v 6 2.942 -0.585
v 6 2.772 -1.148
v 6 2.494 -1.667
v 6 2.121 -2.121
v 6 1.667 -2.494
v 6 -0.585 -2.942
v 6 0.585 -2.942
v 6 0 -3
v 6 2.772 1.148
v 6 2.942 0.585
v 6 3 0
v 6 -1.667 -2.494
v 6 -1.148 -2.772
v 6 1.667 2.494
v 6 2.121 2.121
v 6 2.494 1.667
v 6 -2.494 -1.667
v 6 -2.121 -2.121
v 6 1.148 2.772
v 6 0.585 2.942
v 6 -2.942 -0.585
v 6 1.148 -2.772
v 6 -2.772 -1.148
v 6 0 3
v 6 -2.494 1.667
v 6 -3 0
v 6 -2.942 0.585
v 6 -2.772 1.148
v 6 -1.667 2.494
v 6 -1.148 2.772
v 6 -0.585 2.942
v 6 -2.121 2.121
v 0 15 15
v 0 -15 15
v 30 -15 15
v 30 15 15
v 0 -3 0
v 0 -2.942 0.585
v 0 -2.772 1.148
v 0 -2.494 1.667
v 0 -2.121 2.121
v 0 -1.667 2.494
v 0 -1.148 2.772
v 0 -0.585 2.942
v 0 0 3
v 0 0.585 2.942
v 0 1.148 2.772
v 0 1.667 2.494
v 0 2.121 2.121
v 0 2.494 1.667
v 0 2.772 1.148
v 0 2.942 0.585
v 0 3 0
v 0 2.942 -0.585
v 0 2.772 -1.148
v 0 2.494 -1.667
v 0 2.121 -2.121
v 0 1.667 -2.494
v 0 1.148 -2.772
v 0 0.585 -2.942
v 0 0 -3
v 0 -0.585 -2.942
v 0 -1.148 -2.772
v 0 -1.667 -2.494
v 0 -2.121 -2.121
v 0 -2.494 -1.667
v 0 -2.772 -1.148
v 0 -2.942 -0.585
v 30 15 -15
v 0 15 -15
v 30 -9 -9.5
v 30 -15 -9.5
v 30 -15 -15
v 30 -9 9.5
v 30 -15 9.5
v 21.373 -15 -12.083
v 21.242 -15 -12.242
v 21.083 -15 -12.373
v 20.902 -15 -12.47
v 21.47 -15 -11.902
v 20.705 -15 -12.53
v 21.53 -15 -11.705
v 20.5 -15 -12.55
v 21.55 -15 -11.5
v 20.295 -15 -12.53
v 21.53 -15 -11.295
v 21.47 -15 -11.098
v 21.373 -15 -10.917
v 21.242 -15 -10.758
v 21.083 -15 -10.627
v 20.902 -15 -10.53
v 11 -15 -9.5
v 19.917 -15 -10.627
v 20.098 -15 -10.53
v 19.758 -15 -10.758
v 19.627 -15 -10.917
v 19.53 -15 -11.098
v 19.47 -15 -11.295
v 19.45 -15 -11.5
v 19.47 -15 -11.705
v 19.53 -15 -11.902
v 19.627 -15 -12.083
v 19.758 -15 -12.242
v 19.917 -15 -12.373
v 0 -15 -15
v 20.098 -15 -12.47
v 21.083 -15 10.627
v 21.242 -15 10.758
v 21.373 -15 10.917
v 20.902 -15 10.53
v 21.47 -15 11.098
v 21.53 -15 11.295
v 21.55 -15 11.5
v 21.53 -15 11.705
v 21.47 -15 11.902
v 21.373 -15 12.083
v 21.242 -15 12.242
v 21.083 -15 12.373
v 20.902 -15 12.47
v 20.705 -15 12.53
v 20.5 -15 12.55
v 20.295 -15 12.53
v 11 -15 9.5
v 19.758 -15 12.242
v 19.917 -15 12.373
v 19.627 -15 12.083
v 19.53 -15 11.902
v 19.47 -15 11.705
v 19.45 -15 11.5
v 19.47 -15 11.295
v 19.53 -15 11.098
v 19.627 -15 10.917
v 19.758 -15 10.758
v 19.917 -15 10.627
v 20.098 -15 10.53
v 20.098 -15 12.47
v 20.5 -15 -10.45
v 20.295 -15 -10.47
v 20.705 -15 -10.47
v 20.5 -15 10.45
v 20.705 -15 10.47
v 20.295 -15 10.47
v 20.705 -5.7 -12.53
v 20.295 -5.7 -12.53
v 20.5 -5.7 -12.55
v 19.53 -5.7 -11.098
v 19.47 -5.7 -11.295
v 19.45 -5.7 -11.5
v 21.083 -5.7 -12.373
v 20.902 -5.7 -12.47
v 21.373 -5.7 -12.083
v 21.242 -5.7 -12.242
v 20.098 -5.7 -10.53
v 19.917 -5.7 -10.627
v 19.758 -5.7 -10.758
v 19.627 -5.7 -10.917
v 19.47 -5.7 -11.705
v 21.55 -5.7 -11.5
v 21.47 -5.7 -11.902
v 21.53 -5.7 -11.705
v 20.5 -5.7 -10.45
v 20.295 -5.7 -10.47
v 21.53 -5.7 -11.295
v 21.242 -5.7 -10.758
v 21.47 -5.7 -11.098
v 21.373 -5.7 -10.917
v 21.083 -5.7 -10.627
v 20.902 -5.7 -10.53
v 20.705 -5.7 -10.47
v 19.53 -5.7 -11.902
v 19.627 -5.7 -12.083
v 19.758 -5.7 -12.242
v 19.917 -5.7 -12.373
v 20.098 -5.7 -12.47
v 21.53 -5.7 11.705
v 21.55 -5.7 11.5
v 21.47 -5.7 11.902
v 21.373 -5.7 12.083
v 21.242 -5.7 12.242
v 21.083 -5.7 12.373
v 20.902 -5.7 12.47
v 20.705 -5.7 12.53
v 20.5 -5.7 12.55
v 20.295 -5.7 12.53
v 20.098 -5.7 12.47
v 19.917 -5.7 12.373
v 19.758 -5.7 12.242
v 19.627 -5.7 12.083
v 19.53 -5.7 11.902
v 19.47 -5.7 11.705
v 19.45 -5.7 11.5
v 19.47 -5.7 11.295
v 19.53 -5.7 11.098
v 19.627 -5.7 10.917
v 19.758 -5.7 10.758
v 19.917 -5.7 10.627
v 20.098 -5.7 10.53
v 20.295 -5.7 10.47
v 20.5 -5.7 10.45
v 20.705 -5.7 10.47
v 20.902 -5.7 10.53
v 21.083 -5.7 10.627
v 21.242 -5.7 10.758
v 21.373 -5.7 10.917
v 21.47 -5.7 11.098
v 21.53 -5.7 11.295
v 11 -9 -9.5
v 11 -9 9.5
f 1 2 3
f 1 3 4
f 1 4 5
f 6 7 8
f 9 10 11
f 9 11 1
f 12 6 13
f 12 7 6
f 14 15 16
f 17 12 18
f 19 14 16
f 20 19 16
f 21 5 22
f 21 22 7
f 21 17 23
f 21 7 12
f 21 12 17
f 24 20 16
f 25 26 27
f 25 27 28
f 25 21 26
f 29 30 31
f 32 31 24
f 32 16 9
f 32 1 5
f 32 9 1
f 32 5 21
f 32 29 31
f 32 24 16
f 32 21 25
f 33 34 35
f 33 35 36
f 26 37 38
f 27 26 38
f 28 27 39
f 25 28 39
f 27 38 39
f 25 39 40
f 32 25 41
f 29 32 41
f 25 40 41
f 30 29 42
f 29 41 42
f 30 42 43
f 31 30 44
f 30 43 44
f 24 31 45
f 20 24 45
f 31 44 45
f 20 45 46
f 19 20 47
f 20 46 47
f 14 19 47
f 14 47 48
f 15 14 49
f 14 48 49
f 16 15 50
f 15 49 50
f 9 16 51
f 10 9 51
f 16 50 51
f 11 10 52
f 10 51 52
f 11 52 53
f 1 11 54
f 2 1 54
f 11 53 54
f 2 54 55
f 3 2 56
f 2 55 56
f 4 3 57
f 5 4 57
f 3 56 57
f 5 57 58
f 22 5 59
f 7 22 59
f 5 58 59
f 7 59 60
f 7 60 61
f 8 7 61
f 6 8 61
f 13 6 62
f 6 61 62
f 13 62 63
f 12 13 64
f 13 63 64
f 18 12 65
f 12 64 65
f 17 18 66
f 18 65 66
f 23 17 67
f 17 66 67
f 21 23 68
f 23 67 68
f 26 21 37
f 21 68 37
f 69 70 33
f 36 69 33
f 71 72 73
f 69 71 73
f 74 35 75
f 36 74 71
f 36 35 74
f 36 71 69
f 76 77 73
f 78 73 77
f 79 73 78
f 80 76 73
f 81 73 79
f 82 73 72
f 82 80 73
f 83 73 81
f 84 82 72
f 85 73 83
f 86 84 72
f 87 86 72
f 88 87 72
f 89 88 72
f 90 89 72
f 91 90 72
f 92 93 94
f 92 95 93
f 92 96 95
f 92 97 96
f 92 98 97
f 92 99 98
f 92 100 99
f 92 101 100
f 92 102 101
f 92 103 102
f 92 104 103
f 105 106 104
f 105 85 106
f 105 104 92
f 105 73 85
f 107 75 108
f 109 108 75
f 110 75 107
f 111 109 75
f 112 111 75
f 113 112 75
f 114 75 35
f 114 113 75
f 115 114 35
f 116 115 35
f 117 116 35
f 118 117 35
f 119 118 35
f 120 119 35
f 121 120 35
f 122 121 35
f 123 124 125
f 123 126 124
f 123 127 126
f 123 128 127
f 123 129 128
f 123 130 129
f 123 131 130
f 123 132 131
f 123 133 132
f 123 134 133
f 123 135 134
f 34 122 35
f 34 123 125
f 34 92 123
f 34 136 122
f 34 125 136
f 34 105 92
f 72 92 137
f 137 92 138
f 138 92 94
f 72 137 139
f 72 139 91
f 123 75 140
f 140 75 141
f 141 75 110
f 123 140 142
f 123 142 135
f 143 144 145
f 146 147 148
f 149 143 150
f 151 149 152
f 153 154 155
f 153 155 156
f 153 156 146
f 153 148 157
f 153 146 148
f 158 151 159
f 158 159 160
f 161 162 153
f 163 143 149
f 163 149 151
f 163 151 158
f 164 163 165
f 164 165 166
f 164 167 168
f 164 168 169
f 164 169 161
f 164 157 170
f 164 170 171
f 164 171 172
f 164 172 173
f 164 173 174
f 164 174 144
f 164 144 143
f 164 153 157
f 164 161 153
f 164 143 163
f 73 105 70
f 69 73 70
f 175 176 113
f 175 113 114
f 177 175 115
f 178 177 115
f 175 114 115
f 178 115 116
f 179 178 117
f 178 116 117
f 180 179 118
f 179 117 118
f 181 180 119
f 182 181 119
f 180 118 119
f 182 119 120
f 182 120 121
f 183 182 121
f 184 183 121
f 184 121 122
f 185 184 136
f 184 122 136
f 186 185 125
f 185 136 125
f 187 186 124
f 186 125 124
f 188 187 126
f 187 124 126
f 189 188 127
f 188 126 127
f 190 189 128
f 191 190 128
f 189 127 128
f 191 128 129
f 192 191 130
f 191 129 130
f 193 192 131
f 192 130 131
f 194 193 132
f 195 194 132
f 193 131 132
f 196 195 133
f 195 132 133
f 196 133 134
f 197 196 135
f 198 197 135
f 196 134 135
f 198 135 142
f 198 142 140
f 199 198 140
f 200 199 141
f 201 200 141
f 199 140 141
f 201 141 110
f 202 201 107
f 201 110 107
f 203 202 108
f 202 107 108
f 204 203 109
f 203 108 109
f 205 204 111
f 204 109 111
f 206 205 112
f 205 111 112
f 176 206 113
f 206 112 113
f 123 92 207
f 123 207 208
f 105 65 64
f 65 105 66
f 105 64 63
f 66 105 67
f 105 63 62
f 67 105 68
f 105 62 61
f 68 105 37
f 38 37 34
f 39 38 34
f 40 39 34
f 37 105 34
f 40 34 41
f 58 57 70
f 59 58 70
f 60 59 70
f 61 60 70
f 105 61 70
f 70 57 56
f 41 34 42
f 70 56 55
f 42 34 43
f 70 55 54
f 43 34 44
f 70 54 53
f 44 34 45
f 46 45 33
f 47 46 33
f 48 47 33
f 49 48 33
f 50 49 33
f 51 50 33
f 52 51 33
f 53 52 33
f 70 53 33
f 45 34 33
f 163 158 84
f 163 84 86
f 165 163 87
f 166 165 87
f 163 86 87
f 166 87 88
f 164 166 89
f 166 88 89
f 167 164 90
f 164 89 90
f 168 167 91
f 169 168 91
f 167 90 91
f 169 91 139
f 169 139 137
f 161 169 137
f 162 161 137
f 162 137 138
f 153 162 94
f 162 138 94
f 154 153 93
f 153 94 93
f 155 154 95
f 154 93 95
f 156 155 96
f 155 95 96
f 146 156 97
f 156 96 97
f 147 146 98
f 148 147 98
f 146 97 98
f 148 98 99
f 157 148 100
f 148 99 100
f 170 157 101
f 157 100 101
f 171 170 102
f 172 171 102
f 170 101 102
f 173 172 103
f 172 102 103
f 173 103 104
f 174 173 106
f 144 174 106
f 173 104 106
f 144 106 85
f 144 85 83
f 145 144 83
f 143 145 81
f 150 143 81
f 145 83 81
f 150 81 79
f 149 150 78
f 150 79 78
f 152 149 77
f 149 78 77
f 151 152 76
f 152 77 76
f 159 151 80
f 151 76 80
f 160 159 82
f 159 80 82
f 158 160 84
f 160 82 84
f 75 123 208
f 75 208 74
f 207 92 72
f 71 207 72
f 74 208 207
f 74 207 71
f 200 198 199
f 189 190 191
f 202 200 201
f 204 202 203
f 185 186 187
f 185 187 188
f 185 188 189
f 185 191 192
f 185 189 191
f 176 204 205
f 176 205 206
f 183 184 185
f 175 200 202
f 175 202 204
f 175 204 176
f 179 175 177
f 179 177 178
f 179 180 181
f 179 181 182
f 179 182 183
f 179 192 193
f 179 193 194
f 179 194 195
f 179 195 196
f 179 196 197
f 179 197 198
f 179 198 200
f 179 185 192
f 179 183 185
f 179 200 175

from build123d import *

# Parameters (mm, degrees)
F0_W     = 30
F0_H     = 30
F1_DEPTH = 30
F2_R     = 3
F3_DEPTH = 6
F4_W     = 19
F4_H     = 19
F5_DEPTH = 6
F6_R     = 1.05
F7_DEPTH = 9.3


with BuildPart() as f1:
    # F0 (on Right) → F1 (new body)
    with BuildSketch(Plane.YZ):
        Rectangle(F0_W, F0_H)
    extrude(amount=F1_DEPTH)

    # F2 (on face) → F3 (cut)
    with BuildSketch(Plane(origin=(0, 0, 0), x_dir=(0, -1, 0), z_dir=(-1, 0, 0))):
        Circle(F2_R)
    extrude(amount=-F3_DEPTH, mode=Mode.SUBTRACT)

    # F4 (on face) → F5 (cut)
    with BuildSketch(Plane.XZ.offset(15)):
        with Locations((20.5, 0)):
            Rectangle(F4_W, F4_H)
    extrude(amount=-F5_DEPTH, mode=Mode.SUBTRACT)

    # F6 (on face) → F7 (cut)
    with BuildSketch(Plane.XZ.offset(15)):
        with Locations((20.5, 11.5)):
            Circle(F6_R)
        with Locations((20.5, -11.5)):
            Circle(F6_R)
    extrude(amount=-F7_DEPTH, mode=Mode.SUBTRACT)


solid = f1.part
